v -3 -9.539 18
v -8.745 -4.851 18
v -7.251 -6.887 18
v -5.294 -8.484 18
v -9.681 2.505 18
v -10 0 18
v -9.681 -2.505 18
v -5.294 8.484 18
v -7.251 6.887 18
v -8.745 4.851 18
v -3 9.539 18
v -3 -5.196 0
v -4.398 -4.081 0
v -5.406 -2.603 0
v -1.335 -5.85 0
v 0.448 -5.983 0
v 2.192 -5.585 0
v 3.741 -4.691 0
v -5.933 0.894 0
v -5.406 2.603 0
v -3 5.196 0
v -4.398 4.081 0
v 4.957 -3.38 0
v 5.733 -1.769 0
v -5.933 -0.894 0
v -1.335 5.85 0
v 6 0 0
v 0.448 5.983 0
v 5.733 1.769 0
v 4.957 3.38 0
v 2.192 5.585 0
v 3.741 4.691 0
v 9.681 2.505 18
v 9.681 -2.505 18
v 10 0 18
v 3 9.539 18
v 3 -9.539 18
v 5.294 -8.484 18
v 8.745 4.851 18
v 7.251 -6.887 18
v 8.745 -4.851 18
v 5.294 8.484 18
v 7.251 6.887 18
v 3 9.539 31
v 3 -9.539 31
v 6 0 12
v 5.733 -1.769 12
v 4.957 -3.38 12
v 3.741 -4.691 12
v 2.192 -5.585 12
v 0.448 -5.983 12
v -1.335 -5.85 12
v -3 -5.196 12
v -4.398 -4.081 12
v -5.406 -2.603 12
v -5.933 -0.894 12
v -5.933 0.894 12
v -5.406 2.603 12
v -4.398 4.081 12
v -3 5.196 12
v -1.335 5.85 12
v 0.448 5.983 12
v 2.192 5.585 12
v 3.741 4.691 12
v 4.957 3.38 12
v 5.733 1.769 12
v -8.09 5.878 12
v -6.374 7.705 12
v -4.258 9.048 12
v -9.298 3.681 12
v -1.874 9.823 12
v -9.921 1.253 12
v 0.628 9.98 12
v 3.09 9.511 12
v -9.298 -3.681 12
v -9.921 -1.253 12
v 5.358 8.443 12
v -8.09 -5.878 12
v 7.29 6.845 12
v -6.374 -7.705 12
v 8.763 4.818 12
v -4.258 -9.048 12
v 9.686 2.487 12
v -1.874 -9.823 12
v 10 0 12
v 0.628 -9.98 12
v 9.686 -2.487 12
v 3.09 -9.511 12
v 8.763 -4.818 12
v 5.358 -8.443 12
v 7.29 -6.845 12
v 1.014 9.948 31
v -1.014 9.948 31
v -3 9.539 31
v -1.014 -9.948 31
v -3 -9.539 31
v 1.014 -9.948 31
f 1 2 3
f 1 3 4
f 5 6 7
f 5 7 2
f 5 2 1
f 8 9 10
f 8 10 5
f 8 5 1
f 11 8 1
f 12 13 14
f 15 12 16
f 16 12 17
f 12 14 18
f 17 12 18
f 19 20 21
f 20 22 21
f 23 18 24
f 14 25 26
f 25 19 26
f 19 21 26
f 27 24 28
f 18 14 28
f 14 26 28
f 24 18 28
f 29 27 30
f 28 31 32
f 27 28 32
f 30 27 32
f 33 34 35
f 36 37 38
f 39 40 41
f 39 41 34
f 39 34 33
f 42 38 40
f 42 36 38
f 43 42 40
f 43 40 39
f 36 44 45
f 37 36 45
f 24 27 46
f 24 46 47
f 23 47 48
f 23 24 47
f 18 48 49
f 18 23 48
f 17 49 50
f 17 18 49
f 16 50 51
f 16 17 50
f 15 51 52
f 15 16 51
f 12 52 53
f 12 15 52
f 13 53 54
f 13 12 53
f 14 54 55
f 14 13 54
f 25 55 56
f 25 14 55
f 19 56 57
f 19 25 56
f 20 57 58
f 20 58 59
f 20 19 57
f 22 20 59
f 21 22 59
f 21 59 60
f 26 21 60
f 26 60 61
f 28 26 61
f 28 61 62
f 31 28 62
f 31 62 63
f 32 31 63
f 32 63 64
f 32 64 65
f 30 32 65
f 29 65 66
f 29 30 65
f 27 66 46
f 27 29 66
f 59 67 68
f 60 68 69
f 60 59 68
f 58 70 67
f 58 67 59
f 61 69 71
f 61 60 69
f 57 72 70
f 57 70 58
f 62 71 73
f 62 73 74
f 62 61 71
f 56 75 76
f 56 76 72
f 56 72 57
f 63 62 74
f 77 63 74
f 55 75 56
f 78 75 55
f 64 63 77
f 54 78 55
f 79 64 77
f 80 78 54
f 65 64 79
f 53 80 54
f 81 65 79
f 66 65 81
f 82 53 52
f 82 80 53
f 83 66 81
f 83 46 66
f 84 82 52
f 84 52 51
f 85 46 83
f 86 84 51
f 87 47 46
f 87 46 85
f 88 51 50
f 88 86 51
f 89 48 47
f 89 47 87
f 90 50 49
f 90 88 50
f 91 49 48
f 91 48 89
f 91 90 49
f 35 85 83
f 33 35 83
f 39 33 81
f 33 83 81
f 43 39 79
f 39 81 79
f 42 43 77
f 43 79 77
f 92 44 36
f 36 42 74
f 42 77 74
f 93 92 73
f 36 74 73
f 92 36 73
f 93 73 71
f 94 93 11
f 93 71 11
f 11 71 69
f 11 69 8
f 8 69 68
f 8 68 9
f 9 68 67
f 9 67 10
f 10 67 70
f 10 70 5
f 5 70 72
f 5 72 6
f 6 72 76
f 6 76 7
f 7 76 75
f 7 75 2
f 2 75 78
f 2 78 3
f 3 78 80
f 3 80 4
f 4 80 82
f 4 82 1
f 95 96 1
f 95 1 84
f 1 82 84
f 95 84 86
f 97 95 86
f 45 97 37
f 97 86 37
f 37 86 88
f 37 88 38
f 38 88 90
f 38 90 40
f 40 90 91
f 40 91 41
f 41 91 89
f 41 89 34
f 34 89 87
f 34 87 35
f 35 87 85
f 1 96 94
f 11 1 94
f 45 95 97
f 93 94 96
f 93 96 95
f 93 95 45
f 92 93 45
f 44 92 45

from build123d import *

# Parameters (mm, degrees)
F0_R     = 10
F1_DEPTH = 31
F3_DEPTH = 13
F4_R     = 10
F4_R_2   = 6
F5_DEPTH = 12


with BuildPart() as f1:
    # F0 (on Top) → F1 (new body)
    with BuildSketch(Plane.XY):
        Circle(F0_R)
    extrude(amount=F1_DEPTH)

    # F2 (on face) → F3 (cut)
    with BuildSketch(Plane.XY.offset(31)):
        with BuildLine():
            Line((3, 9.5393920142), (3, 0))
            Line((3, 0), (3, -9.5393920142))
            ThreePointArc((3, -9.5393920142), (8.0622577483, -5.9160797831), (10, 0))
            ThreePointArc((10, 0), (8.0622577483, 5.9160797831), (3, 9.5393920142))
        make_face()
        with BuildLine():
            Line((-3, -9.5393920142), (-3, 0))
            Line((-3, 0), (-3, 9.5393920142))
            ThreePointArc((-3, 9.5393920142), (-10, 0), (-3, -9.5393920142))
        make_face()
    extrude(amount=-F3_DEPTH, mode=Mode.SUBTRACT)

    # F4 (on face) → F5 (cut)
    with BuildSketch(Plane(origin=(0, 0, 0), x_dir=(1, 0, 0), z_dir=(0, 0, -1))):
        Circle(F4_R)
        Circle(F4_R_2, mode=Mode.SUBTRACT)
    extrude(amount=-F5_DEPTH, mode=Mode.SUBTRACT)


solid = f1.part
